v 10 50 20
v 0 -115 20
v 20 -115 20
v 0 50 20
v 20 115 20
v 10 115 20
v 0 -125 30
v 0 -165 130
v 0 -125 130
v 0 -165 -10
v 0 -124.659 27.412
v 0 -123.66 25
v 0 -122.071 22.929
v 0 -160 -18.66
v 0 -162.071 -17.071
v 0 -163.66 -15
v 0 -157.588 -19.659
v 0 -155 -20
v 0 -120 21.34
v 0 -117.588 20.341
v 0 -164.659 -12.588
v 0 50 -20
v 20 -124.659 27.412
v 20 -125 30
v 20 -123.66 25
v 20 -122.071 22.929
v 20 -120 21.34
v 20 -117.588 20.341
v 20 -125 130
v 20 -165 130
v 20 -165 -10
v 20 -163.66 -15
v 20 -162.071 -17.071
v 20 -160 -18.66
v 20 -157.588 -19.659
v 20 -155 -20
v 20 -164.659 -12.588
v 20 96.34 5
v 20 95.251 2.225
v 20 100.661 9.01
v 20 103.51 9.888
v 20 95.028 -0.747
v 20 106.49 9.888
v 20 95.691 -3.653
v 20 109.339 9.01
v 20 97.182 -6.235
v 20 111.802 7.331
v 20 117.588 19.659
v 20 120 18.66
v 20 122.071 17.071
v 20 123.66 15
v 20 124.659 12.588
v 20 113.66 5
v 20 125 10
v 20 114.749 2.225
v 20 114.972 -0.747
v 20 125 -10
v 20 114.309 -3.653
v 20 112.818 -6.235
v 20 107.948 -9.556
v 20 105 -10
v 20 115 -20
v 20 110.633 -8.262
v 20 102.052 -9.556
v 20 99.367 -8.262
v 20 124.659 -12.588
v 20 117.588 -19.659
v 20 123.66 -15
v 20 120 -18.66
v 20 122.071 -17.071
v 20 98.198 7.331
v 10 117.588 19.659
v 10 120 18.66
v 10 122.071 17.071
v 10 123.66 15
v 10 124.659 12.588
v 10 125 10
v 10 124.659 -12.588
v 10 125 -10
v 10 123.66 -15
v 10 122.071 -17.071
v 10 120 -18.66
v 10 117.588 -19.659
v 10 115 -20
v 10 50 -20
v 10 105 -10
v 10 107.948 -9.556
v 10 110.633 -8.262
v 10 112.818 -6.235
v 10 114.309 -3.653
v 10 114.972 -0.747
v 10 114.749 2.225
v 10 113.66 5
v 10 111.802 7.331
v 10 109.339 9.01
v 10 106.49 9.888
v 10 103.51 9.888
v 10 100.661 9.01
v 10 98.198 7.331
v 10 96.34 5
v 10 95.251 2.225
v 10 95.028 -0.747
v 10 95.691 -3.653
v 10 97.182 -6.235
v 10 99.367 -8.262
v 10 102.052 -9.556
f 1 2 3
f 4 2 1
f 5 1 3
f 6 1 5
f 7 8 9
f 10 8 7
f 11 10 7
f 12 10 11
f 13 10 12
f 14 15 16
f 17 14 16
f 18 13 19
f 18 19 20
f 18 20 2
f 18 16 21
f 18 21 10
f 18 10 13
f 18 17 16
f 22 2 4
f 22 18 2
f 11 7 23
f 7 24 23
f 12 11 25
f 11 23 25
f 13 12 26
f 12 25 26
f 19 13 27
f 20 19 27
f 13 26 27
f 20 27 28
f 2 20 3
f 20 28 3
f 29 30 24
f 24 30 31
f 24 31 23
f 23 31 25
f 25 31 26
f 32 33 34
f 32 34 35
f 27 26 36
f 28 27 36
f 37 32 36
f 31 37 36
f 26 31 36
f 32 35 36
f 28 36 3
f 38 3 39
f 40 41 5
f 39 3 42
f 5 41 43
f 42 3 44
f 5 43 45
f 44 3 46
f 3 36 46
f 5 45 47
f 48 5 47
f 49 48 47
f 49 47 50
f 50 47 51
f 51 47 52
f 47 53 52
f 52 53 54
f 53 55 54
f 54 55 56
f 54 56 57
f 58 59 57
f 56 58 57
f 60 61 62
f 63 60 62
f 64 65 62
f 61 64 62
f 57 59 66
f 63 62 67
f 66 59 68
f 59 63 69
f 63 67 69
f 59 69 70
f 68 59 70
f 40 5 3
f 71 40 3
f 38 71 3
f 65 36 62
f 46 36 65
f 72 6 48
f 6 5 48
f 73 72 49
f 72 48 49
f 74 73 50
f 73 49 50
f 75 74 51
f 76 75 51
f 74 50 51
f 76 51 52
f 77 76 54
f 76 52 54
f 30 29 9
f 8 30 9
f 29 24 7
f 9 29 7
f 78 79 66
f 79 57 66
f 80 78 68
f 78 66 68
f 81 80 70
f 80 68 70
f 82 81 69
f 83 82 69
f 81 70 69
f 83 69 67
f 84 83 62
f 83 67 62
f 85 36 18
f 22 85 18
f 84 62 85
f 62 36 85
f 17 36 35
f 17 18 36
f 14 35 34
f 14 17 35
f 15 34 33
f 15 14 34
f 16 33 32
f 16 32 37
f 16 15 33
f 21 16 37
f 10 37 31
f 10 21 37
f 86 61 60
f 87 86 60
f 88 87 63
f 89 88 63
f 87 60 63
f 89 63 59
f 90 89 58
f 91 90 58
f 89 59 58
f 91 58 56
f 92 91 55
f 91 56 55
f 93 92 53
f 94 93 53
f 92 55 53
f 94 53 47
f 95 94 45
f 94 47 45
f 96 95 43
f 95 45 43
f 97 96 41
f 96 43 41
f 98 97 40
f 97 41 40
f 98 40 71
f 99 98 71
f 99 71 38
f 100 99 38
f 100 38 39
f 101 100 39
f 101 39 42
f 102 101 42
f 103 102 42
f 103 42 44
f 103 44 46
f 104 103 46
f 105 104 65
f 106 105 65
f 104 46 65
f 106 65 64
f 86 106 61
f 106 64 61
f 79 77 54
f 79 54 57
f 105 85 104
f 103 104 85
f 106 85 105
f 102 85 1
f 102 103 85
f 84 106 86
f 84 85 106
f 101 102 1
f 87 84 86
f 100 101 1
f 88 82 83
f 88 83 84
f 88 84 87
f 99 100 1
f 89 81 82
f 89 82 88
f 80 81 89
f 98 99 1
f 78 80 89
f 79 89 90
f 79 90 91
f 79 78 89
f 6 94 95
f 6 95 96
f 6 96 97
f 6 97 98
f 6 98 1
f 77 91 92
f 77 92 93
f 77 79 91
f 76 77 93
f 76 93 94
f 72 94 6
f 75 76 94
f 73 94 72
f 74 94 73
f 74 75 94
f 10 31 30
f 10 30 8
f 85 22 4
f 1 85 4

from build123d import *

# Parameters (mm, degrees)
SKETCH1_W           = 40
SKETCH1_H           = 250
BOSS_EXTRUDE1_DEPTH = 20
SKETCH2_W           = 40
SKETCH2_H           = 75
CUT_EXTRUDE1_DEPTH  = 10
FILLET1_R           = 10
SKETCH3_R           = 10
CUT_EXTRUDE2_DEPTH  = 10
SKETCH5_W           = 20
SKETCH5_H           = 40
BOSS_EXTRUDE2_DEPTH = 150
FILLET2_R           = 10
FILLET3_R           = 10


with BuildPart() as part:
    # Sketch1 → Boss-Extrude1 (new body)
    with BuildSketch(Plane(origin=(0, 0, 0), x_dir=(0, 0, -1), z_dir=(1, 0, 0))):
        Rectangle(SKETCH1_W, SKETCH1_H)
    extrude(amount=BOSS_EXTRUDE1_DEPTH)

    # Sketch2 → Cut-Extrude1 (cut)
    with BuildSketch(Plane.ZY):
        with Locations((0, 87.5)):
            Rectangle(SKETCH2_W, SKETCH2_H)
    extrude(amount=-CUT_EXTRUDE1_DEPTH, mode=Mode.SUBTRACT)

    # Fillet1
    fillet1_edges = [part.edges().sort_by_distance(p)[0] for p in [
        (15, 125, 20),
        (15, 125, -20),
    ]]
    fillet(fillet1_edges, radius=FILLET1_R)

    # Sketch3 → Cut-Extrude2 (cut)
    with BuildSketch(Plane(origin=(20, 0, 0), x_dir=(0, 0, -1), z_dir=(1, 0, 0))):
        with Locations((0, 105)):
            Circle(SKETCH3_R)
    extrude(amount=-CUT_EXTRUDE2_DEPTH, mode=Mode.SUBTRACT)

    # Sketch5 → Boss-Extrude2 (add)
    with BuildSketch(Plane(origin=(0, 0, -20), x_dir=(-1, 0, 0), z_dir=(0, 0, -1))):
        with Locations((-10, -145)):
            Rectangle(SKETCH5_W, SKETCH5_H)
    extrude(amount=-BOSS_EXTRUDE2_DEPTH)

    # Fillet2
    fillet2_edges = [part.edges().sort_by_distance(p)[0] for p in [
        (10, -165, -20),
    ]]
    fillet(fillet2_edges, radius=FILLET2_R)

    # Fillet3
    fillet3_edges = [part.edges().sort_by_distance(p)[0] for p in [
        (10, -125, 20),
    ]]
    fillet(fillet3_edges, radius=FILLET3_R)


solid = part.part
